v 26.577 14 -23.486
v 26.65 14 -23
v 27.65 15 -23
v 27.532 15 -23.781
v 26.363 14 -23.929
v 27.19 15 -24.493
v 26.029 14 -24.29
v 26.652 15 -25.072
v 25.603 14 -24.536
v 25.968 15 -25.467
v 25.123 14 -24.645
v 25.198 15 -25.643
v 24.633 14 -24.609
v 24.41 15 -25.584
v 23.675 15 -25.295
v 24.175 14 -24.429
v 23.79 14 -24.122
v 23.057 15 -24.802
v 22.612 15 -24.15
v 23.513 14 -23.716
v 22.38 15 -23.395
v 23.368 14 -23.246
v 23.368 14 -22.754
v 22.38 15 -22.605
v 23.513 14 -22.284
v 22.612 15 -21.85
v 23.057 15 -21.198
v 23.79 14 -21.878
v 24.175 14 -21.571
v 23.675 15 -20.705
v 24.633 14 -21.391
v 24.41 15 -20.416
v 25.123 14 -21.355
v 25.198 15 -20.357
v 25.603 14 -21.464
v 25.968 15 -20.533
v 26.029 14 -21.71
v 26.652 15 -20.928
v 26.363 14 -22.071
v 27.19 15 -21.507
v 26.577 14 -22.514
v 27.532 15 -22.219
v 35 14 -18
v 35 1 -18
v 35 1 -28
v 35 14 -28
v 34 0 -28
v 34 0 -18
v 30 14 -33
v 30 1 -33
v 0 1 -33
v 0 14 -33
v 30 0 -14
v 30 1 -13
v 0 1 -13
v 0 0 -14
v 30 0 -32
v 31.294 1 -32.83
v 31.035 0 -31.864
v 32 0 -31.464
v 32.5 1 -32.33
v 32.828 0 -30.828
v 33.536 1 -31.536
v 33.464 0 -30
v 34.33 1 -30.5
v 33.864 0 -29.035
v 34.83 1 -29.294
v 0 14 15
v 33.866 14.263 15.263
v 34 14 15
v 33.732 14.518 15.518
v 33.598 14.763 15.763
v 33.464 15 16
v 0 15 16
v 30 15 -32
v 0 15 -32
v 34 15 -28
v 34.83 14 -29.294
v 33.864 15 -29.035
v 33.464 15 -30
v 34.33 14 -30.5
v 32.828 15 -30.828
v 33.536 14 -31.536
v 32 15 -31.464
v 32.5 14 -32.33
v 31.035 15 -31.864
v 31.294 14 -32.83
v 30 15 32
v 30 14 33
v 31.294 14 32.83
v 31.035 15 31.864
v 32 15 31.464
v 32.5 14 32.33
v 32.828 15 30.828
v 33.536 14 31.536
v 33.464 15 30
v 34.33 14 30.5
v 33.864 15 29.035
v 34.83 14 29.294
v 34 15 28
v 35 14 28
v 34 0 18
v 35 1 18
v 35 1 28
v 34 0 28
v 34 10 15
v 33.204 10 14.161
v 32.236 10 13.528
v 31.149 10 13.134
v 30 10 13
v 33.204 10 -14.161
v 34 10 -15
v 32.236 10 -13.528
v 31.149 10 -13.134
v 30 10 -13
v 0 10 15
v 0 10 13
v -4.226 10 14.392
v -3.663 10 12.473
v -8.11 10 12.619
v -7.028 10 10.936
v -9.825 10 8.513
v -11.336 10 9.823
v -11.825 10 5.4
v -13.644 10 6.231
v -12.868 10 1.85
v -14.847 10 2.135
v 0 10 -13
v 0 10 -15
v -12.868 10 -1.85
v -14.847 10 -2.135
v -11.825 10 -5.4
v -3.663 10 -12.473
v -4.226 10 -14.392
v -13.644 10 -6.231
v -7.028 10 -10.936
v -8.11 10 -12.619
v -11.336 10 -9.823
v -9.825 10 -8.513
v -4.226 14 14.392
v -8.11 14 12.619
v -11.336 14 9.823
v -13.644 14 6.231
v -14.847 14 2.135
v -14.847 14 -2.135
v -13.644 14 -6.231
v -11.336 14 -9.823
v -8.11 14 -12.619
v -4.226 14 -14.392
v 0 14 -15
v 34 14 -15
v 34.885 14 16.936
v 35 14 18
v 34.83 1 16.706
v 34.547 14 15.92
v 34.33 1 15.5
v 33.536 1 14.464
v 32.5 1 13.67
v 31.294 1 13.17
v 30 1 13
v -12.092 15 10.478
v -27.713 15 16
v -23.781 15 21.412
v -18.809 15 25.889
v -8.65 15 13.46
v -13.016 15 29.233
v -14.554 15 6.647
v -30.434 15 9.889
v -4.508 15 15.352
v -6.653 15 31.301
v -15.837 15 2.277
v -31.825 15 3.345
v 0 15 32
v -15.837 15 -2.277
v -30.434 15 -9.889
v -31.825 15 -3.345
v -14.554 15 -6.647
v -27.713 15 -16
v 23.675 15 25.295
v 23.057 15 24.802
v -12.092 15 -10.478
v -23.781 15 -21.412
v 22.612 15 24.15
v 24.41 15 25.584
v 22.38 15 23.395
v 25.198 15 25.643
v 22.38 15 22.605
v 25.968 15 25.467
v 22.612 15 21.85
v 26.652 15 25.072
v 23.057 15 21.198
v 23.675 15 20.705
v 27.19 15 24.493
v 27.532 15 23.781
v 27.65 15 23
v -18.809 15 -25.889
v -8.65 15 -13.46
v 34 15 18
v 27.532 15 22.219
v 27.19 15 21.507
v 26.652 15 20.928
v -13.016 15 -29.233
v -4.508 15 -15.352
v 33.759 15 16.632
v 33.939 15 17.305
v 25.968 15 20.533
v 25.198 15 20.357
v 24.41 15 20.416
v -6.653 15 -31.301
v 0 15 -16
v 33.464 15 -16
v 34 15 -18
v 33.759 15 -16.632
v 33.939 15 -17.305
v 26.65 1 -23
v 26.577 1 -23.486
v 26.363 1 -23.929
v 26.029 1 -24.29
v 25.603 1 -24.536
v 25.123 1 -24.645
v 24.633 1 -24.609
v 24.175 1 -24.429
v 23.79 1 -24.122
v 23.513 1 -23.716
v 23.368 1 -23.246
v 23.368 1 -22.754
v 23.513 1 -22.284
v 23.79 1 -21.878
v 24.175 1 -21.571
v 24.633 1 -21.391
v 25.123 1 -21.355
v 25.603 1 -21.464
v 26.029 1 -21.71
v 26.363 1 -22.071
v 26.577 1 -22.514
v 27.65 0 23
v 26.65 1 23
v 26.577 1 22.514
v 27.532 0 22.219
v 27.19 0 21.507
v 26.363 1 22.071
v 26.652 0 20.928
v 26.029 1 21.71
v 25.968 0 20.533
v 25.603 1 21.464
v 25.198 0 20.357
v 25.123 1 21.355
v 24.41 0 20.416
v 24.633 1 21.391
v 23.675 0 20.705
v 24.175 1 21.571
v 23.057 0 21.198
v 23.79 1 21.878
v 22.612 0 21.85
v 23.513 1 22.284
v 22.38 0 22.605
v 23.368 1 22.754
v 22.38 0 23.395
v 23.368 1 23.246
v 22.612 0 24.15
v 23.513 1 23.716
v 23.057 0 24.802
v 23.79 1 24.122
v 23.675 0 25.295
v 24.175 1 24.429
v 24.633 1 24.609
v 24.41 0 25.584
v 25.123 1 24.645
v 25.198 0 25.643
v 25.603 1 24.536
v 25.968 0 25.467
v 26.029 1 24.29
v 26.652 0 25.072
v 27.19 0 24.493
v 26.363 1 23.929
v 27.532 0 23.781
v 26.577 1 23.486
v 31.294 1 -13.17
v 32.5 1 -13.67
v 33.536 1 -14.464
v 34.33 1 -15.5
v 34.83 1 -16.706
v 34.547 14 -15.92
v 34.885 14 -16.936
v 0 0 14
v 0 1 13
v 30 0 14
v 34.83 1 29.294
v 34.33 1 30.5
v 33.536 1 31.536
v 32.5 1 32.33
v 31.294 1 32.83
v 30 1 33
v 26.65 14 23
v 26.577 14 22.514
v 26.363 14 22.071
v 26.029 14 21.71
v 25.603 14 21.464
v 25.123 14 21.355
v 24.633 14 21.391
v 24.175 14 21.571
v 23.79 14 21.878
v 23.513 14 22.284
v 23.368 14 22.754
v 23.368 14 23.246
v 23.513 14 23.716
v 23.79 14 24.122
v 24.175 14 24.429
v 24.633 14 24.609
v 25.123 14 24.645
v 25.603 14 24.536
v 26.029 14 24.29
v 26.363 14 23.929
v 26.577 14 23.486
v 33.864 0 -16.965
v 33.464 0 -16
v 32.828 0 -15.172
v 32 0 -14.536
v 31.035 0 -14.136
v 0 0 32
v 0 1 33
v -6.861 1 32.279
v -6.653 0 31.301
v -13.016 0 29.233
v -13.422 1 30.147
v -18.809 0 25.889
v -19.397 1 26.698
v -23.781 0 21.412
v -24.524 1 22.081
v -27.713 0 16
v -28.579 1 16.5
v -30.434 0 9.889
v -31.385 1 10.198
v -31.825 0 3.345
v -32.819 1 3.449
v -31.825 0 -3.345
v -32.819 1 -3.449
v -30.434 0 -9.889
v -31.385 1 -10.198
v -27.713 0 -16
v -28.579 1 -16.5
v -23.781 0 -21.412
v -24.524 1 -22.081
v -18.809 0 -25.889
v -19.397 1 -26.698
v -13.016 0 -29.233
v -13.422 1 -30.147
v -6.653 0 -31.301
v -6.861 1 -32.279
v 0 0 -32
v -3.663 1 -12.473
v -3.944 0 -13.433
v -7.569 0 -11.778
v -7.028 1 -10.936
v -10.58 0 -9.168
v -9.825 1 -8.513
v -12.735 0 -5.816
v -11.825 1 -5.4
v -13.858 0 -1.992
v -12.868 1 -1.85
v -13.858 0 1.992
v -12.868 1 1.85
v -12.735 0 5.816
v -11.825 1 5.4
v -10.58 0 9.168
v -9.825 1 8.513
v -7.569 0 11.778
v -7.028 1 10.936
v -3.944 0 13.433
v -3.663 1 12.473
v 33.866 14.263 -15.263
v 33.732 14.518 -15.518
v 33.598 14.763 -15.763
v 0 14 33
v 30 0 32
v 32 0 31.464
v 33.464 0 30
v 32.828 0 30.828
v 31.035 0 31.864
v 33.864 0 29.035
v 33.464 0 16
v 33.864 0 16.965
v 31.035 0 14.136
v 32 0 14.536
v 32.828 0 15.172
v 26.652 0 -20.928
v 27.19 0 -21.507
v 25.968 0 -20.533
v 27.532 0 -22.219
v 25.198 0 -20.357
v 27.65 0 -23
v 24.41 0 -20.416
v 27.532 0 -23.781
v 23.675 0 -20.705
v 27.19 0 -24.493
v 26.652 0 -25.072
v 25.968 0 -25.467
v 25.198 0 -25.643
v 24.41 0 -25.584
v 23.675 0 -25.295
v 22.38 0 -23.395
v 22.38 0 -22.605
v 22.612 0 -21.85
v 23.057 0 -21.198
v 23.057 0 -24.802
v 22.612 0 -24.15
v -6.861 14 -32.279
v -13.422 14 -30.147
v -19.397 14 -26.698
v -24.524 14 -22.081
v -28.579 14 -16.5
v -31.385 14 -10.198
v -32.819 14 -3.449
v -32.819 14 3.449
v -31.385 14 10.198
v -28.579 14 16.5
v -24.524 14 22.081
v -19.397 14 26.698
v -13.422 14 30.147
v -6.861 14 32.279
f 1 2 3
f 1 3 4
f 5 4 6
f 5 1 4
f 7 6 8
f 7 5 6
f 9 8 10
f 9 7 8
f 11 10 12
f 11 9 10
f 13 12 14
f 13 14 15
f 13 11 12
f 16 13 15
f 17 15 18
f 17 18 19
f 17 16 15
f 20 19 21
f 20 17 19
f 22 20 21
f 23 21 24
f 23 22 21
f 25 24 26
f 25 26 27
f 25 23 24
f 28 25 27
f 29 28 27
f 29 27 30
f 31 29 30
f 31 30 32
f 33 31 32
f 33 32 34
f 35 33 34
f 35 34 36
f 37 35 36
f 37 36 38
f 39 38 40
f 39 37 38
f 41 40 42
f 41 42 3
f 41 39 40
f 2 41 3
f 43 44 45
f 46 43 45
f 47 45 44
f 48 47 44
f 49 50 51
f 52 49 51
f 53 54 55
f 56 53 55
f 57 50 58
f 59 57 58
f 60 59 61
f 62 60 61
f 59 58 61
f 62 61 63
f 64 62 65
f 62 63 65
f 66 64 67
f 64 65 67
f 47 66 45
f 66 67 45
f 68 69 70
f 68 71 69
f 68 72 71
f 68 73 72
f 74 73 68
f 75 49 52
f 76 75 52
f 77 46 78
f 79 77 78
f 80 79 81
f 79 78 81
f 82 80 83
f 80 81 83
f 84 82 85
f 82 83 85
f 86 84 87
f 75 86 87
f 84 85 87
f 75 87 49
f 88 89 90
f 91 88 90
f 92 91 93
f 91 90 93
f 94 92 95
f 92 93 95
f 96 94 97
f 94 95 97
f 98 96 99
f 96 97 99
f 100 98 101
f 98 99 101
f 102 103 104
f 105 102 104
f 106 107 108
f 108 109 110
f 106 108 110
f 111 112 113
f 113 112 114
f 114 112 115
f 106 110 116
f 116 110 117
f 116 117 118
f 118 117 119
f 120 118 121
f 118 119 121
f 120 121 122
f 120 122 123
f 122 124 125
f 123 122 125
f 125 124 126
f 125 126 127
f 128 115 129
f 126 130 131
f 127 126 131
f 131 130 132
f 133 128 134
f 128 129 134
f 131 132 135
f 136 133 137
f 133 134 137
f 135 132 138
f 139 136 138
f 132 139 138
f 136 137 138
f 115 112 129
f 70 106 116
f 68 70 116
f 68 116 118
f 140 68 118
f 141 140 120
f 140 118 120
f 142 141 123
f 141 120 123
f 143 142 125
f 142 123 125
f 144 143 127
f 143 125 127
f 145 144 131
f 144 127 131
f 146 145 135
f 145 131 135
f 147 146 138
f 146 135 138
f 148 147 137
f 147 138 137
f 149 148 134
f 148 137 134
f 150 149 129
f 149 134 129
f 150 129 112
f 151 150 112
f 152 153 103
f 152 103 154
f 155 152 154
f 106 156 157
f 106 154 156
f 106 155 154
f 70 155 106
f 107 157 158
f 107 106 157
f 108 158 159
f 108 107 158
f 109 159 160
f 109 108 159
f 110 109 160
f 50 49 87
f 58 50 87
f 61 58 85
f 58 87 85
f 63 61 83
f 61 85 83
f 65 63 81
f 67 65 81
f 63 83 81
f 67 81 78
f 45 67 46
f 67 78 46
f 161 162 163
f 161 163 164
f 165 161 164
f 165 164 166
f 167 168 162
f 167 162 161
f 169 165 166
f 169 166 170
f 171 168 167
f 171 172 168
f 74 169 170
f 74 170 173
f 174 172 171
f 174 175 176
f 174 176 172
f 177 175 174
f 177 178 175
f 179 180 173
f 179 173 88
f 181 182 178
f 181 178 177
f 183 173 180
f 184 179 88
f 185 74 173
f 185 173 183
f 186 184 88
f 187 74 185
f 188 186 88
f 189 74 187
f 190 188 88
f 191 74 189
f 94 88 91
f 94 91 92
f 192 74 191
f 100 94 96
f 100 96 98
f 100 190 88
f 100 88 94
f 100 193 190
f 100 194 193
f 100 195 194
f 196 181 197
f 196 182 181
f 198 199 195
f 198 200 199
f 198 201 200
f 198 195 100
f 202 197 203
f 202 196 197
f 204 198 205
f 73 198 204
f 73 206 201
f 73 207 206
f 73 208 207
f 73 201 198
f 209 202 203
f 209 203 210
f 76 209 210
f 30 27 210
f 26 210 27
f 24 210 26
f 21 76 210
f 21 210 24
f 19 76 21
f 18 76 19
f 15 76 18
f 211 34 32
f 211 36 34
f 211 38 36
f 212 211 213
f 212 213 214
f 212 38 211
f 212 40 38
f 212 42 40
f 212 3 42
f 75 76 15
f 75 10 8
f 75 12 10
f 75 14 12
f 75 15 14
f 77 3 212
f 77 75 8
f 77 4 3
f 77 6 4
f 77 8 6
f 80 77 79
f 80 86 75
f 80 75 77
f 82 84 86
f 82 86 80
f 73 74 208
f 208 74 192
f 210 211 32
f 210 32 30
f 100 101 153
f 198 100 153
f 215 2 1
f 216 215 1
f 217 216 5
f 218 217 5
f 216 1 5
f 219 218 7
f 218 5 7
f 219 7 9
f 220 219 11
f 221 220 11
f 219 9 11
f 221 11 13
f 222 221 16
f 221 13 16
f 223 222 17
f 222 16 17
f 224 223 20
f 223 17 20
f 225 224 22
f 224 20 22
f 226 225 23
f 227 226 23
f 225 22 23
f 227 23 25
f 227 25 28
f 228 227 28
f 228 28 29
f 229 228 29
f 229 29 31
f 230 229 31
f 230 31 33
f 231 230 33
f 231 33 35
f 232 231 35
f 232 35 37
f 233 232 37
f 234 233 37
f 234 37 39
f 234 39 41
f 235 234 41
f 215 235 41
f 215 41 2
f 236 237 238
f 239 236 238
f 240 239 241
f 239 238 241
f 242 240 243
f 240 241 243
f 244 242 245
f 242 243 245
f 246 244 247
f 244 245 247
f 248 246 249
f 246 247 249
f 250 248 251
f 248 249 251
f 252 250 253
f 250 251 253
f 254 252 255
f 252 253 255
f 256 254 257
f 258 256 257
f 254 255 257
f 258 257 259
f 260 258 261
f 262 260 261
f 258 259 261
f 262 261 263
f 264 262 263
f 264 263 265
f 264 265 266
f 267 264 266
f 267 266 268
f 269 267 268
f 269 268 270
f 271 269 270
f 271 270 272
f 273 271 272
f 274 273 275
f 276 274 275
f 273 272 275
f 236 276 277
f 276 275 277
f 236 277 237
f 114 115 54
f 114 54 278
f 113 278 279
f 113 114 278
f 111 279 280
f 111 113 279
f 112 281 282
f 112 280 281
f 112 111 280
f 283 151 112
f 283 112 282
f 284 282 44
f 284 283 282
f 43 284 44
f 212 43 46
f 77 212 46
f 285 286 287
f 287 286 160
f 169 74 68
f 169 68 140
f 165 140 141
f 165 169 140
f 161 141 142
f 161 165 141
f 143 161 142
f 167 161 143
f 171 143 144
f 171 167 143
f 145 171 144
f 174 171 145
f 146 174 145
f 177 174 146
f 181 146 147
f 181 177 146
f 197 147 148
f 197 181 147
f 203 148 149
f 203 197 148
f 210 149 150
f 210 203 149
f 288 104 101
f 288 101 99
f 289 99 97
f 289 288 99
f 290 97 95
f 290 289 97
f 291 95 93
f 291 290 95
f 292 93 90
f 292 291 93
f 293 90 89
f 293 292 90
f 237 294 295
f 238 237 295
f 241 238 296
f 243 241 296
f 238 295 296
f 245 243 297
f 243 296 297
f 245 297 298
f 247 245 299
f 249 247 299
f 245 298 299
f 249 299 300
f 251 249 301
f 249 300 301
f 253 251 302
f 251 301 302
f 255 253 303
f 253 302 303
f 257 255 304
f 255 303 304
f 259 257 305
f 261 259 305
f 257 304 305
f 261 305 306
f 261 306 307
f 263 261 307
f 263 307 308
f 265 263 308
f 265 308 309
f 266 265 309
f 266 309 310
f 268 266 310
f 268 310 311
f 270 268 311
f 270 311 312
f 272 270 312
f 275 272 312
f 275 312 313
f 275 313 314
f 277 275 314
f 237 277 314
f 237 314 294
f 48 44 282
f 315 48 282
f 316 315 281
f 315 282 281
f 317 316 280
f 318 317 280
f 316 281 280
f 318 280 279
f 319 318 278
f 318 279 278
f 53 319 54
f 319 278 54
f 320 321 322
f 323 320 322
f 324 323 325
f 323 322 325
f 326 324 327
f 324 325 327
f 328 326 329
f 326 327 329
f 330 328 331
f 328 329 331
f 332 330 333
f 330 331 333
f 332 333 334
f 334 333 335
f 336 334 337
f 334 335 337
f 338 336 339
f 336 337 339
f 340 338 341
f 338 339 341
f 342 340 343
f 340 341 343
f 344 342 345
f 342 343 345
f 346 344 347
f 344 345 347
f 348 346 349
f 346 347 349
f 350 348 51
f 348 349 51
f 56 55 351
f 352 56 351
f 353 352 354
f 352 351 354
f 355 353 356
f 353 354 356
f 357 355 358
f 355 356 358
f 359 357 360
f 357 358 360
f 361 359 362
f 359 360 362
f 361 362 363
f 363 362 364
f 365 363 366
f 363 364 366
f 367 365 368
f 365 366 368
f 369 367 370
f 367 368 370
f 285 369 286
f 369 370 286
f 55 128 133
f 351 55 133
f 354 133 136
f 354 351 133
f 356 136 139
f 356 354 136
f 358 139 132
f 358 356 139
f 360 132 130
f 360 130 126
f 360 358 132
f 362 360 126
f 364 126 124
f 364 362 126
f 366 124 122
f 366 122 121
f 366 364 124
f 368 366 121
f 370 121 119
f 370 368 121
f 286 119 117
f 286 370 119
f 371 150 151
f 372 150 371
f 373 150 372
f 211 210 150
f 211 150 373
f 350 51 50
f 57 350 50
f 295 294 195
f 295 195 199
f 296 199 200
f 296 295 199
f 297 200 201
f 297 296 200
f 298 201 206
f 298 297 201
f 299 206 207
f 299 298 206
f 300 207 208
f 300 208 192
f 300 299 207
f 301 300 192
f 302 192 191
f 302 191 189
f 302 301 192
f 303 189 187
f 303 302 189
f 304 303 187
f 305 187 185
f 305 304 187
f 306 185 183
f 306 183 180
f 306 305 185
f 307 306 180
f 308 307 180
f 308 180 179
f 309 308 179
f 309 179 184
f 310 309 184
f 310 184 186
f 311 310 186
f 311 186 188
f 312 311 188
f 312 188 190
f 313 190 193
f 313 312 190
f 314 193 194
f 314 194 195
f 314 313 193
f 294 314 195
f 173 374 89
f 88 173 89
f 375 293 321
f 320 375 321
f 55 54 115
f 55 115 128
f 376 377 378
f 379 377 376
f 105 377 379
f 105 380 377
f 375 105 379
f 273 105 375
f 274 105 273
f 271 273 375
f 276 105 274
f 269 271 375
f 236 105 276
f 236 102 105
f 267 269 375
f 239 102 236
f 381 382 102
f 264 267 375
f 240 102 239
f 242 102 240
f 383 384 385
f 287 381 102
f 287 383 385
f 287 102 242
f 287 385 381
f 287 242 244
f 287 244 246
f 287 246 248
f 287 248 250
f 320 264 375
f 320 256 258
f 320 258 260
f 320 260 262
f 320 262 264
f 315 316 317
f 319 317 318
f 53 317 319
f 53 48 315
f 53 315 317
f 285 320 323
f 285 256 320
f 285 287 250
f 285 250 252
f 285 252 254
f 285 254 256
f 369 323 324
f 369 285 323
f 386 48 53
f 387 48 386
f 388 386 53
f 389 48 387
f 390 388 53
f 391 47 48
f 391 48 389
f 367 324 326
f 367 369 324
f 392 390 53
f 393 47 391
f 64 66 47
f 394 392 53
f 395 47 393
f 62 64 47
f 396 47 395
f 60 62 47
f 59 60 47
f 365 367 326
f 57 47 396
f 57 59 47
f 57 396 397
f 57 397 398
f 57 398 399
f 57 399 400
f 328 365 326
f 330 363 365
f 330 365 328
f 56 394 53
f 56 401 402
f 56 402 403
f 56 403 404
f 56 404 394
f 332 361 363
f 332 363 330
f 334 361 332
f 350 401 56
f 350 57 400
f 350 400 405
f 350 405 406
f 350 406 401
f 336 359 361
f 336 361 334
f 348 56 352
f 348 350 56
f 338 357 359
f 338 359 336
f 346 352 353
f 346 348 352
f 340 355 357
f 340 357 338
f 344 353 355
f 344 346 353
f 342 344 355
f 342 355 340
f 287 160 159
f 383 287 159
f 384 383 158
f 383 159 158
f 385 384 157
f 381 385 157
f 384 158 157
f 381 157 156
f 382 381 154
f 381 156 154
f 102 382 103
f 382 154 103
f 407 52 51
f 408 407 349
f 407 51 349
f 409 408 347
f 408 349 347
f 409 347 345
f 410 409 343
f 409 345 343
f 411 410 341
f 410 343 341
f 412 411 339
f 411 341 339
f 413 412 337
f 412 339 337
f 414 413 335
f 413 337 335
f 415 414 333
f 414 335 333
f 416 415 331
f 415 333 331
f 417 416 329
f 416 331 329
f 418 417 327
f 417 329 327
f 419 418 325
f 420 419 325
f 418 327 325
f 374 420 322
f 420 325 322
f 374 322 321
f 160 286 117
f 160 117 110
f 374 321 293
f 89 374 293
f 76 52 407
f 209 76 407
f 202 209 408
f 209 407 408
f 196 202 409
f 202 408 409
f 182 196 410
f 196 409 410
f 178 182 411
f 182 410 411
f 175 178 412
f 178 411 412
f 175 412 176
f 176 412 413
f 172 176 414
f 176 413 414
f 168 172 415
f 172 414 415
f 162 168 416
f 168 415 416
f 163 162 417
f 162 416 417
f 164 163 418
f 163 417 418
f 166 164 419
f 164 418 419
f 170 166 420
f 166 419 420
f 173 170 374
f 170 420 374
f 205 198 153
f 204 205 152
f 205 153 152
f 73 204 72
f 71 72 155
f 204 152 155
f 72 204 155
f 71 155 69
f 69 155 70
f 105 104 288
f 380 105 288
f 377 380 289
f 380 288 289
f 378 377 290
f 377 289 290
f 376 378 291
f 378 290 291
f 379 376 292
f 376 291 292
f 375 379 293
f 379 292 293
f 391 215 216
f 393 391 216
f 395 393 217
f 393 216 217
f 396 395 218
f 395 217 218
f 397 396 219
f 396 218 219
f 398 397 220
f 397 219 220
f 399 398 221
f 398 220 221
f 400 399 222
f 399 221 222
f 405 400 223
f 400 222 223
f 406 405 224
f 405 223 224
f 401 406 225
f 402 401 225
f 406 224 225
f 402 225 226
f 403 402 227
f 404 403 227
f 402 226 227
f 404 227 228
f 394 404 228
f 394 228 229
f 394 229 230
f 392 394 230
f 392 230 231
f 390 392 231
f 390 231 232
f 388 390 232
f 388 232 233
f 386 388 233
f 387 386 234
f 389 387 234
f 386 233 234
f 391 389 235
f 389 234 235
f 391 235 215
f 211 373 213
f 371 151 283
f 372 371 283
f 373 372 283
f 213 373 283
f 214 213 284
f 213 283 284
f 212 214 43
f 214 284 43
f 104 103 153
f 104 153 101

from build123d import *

# Parameters (mm, degrees)
BOSS_EXTRUDE1_DEPTH = 10
BOSS_EXTRUDE3_DEPTH = 5
FILLET1_R           = 5
SKETCH5_R           = 1.65
CUT_EXTRUDE2_DEPTH  = 20
CHAMFER1_SIZE       = 1


with BuildPart() as part:
    # Sketch1 → Boss-Extrude1 (new body)
    with BuildSketch(Plane(origin=(0, 0, 0), x_dir=(1, 0, 0), z_dir=(0, 1, 0))):
        with BuildLine():
            Line((0, 33), (35, 33))
            Line((35, 33), (35, 13))
            Line((35, 13), (0, 13))
            ThreePointArc((0, 13), (-13, 0), (0, -13))
            Line((0, -13), (35, -13))
            Line((35, -13), (35, -33))
            Line((35, -33), (0, -33))
            ThreePointArc((0, -33), (-33, 0), (0, 33))
        make_face()
    extrude(amount=BOSS_EXTRUDE1_DEPTH)

    # Sketch4 → Boss-Extrude3 (add)
    with BuildSketch(Plane(origin=(0, 10, 0), x_dir=(1, 0, 0), z_dir=(0, 1, 0))):
        with BuildLine():
            Line((0, 15), (35, 15))
            Line((35, 15), (35, 33))
            Line((35, 33), (0, 33))
            ThreePointArc((0, 33), (-33, 0), (0, -33))
            Line((0, -33), (35, -33))
            Line((35, -33), (35, -15))
            Line((35, -15), (0, -15))
            ThreePointArc((0, -15), (-15, 0), (0, 15))
        make_face()
    extrude(amount=BOSS_EXTRUDE3_DEPTH)

    # Fillet1
    fillet1_edges = [part.edges().sort_by_distance(p)[0] for p in [
        (35, 7.5, -33),
        (35, 5, -13),
        (35, 5, 13),
        (35, 7.5, 33),
    ]]
    fillet(fillet1_edges, radius=FILLET1_R)

    # Sketch5 → Cut-Extrude2 (cut)
    with BuildSketch(Plane(origin=(0, 15, 0), x_dir=(1, 0, 0), z_dir=(0, 1, 0))):
        with Locations((25, 23)):
            Circle(SKETCH5_R)
        with Locations((25, -23)):
            Circle(SKETCH5_R)
    extrude(amount=-CUT_EXTRUDE2_DEPTH, mode=Mode.SUBTRACT)

    # Chamfer1
    chamfer1_edges = [part.edges().sort_by_distance(p)[0] for p in [
        (15, 0, 33),
        (-33, 0, 0),
        (-15, 15, 0),
        (17, 15, -15),
        (-33, 15, 0),
        (15, 15, 33),
        (15, 0, -33),
        (15, 15, -33),
        (35, 0, -23),
        (15, 0, 13),
        (35, 0, 23),
        (33.535533906, 0, 31.535533906),
        (33.535533906, 0, 14.464466094),
        (33.535533906, 0, -14.464466094),
        (33.535533906, 0, -31.535533906),
        (35, 15, -23),
        (35, 15, 23),
        (17, 15, 15),
        (33.535533906, 15, 31.535533906),
        (34.74341649, 15, 16.41886117),
        (34.74341649, 15, -16.41886117),
        (33.535533906, 15, -31.535533906),
        (23.35, 0, -23),
        (23.35, 15, -23),
        (23.35, 0, 23),
        (23.35, 15, 23),
        (15, 0, -13),
        (-13, 0, 0),
    ]]
    chamfer(chamfer1_edges, length=CHAMFER1_SIZE)


solid = part.part
